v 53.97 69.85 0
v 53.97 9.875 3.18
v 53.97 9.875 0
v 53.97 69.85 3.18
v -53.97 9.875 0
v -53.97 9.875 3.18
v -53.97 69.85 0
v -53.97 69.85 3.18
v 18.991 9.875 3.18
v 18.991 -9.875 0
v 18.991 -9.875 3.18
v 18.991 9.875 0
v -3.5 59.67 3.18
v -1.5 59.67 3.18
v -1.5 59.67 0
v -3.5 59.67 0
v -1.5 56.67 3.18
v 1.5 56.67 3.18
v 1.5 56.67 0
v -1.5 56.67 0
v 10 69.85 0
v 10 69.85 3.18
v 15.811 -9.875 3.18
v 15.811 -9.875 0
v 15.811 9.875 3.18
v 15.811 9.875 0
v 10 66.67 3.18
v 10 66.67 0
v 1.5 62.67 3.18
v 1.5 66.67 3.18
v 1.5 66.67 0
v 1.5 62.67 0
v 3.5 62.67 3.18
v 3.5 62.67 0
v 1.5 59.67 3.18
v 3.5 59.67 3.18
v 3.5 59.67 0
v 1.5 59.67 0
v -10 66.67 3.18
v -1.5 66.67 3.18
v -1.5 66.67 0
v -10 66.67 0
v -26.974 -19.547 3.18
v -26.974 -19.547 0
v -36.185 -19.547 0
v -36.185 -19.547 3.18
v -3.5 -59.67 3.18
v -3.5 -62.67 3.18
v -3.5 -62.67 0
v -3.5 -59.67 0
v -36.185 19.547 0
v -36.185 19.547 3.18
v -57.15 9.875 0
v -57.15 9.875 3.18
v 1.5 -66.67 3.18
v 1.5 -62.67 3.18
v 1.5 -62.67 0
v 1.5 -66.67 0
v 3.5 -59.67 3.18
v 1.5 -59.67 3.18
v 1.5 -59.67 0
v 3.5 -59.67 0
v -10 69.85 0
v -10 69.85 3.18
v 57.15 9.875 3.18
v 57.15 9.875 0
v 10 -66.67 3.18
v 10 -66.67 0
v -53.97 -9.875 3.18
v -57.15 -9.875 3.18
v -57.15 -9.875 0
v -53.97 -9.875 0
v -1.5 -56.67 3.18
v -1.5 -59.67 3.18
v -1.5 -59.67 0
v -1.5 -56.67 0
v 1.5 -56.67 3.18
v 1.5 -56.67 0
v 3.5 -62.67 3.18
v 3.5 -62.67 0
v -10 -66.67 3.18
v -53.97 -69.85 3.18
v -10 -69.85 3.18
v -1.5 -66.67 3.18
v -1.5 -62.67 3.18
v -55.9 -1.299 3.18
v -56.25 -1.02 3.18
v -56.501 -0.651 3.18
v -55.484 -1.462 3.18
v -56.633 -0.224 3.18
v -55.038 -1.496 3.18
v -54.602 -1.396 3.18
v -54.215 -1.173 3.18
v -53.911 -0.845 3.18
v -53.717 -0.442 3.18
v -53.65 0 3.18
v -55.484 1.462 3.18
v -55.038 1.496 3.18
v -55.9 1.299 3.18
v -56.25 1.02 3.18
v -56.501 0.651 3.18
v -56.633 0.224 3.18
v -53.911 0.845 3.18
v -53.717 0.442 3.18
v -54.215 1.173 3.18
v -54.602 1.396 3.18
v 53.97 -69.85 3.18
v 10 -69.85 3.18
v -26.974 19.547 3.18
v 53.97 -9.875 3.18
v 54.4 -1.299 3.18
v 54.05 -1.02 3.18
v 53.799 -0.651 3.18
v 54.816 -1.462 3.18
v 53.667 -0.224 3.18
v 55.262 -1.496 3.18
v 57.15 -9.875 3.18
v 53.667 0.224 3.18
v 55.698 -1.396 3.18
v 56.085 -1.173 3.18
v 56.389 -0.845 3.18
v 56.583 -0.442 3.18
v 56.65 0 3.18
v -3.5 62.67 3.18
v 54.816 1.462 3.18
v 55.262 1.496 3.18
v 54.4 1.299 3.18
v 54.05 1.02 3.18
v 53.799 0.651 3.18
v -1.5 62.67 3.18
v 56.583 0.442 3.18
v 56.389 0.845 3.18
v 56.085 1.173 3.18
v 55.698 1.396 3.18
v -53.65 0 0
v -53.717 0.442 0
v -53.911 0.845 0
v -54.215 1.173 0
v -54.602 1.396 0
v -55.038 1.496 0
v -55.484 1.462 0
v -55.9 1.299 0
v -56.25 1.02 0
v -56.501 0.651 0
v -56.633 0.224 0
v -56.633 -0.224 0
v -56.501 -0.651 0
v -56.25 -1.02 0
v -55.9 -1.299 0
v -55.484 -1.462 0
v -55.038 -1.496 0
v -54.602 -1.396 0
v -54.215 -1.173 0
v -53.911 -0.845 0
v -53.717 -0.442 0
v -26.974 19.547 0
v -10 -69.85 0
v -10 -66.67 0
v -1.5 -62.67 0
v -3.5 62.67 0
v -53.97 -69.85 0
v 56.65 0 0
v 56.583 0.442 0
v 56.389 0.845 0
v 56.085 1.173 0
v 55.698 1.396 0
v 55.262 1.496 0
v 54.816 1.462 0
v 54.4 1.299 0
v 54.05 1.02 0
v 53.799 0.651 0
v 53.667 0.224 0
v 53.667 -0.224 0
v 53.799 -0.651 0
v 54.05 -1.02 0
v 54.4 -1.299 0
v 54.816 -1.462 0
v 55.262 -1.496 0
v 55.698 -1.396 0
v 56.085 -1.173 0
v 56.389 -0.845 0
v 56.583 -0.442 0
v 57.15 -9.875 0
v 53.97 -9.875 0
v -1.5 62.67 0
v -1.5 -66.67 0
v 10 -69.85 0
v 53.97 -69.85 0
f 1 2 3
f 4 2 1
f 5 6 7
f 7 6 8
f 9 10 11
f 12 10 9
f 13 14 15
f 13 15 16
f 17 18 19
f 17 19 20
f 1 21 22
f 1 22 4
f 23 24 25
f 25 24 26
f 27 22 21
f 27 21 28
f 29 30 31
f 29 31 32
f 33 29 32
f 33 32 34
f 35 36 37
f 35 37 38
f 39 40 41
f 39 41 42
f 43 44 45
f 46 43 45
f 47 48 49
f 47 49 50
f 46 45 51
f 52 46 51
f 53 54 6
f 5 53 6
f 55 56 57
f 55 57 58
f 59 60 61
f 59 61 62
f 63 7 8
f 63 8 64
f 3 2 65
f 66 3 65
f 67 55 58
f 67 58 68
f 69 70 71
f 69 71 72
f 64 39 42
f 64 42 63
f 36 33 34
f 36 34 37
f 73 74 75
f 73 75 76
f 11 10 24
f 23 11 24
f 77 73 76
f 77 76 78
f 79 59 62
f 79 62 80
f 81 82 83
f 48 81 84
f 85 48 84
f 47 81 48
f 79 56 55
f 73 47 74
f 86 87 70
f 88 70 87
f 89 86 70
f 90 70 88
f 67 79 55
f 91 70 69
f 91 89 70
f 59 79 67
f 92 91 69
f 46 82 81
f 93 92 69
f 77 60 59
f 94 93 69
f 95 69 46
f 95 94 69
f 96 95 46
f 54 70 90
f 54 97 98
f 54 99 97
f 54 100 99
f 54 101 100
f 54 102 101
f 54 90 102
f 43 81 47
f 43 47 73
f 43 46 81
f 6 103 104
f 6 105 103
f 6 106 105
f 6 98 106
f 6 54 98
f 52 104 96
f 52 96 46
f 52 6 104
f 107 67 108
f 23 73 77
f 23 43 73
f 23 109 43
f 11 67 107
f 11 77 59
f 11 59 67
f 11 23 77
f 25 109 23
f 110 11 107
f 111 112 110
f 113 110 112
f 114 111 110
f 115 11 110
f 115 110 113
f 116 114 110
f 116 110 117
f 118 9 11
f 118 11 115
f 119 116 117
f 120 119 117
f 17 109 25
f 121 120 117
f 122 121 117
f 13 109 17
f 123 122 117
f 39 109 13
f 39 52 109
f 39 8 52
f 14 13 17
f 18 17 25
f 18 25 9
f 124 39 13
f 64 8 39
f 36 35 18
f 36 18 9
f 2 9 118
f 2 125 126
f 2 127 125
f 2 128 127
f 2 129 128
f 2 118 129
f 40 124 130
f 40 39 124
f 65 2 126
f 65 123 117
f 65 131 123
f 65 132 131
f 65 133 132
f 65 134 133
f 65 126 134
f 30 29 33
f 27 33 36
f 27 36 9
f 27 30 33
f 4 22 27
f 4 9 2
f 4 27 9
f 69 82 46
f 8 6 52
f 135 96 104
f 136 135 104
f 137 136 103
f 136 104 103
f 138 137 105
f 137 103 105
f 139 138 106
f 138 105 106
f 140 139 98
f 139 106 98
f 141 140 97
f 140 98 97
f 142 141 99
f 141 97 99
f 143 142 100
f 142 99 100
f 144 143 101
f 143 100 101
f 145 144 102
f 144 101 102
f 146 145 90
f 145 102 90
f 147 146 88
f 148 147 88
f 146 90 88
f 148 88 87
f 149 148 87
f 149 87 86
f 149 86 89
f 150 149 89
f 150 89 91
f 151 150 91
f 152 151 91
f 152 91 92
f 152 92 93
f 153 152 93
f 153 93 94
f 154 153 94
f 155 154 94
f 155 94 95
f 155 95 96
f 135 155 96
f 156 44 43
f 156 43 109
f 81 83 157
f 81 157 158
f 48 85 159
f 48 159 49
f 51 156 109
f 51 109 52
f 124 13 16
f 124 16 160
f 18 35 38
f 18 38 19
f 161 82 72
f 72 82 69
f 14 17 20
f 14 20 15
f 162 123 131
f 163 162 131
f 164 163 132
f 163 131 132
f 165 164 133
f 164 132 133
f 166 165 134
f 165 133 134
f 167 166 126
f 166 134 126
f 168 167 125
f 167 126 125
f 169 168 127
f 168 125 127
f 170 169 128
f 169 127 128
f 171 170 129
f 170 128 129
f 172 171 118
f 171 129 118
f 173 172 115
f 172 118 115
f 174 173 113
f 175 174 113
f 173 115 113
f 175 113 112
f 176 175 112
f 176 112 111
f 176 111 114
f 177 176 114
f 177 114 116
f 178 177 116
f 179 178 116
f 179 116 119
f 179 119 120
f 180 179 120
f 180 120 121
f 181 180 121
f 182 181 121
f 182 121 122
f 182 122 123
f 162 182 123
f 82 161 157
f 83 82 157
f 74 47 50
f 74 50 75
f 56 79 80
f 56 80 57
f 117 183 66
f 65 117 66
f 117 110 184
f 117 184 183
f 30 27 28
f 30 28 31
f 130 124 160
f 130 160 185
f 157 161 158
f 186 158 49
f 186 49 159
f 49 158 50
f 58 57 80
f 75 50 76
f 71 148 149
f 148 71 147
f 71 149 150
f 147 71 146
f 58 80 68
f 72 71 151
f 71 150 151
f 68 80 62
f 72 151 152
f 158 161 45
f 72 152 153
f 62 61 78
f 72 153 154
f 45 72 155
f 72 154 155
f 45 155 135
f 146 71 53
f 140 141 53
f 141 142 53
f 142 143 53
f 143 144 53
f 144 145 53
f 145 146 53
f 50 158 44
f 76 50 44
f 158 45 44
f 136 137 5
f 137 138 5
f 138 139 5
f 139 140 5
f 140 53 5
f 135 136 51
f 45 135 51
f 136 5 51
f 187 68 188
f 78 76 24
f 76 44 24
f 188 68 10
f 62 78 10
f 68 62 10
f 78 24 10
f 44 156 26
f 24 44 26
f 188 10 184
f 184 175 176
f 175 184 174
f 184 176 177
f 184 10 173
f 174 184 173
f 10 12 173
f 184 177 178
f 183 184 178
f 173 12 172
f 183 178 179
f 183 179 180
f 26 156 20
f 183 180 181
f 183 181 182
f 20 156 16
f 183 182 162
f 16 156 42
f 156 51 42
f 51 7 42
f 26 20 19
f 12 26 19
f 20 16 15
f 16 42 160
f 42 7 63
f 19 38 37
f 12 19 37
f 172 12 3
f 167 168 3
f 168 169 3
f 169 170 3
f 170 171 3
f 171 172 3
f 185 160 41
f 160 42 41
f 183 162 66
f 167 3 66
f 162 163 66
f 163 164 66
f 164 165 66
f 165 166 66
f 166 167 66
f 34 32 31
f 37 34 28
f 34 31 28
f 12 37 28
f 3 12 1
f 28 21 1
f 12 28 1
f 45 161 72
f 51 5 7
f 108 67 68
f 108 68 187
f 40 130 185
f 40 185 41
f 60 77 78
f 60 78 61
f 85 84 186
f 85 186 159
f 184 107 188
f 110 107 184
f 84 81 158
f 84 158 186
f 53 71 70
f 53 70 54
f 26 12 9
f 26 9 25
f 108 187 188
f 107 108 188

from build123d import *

# Parameters (mm, degrees)
SKETCH1_W           = 114.3
SKETCH1_H           = 139.7
BOSS_EXTRUDE1_DEPTH = 3.18
SKETCH2_R           = 1.5
SKETCH2_W           = 3.18
SKETCH2_H           = 59.975
CUT_EXTRUDE1_DEPTH  = 4.18
SKETCH3_W           = 3.18
SKETCH3_H           = 19.75
CUT_EXTRUDE2_DEPTH  = 3.18
SKETCH4_W           = 9.210739152
SKETCH4_H           = 39.093434174
CUT_EXTRUDE3_DEPTH  = 3.18


with BuildPart() as part:
    # Sketch1 → Boss-Extrude1 (new body)
    with BuildSketch(Plane.XY):
        Rectangle(SKETCH1_W, SKETCH1_H)
    extrude(amount=BOSS_EXTRUDE1_DEPTH)

    # Sketch2 → Cut-Extrude1 (cut, through all)
    with BuildSketch(Plane.XY.offset(3.18)):
        with Locations((-55.15, 0)):
            Circle(SKETCH2_R)
        with Locations((55.15, 0)):
            Circle(SKETCH2_R)
        Polygon((-10, 69.85), (10, 69.85), (10, 66.67), (1.5, 66.67), (1.5, 62.67), (3.5, 62.67), (3.5, 59.67), (1.5, 59.67), (1.5, 56.67), (-1.5, 56.67), (-1.5, 59.67), (-3.5, 59.67), (-3.5, 62.67), (-1.5, 62.67), (-1.5, 66.67), (-10, 66.67), align=None)
        Polygon((-10, -69.85), (-10, -66.67), (-1.5, -66.67), (-1.5, -62.67), (-3.5, -62.67), (-3.5, -59.67), (-1.5, -59.67), (-1.5, -56.67), (1.5, -56.67), (1.5, -59.67), (3.5, -59.67), (3.5, -62.67), (1.5, -62.67), (1.5, -66.67), (10, -66.67), (10, -69.85), align=None)
        with Locations((-55.56, 39.8625)):
            Rectangle(SKETCH2_W, SKETCH2_H)
        with Locations((-55.56, -39.8625)):
            Rectangle(SKETCH2_W, SKETCH2_H)
        with Locations((55.56, -39.8625)):
            Rectangle(SKETCH2_W, SKETCH2_H)
        with Locations((55.56, 39.8625)):
            Rectangle(SKETCH2_W, SKETCH2_H)
    extrude(amount=-CUT_EXTRUDE1_DEPTH, mode=Mode.SUBTRACT)

    # Sketch3 → Cut-Extrude2 (cut)
    with BuildSketch(Plane(origin=(0, 0, 0), x_dir=(-1, 0, 0), z_dir=(0, 0, -1))):
        with Locations((-17.401387583, 0)):
            Rectangle(SKETCH3_W, SKETCH3_H)
    extrude(amount=-CUT_EXTRUDE2_DEPTH, mode=Mode.SUBTRACT)

    # Sketch4 → Cut-Extrude3 (cut)
    with BuildSketch(Plane(origin=(0, 0, 0), x_dir=(-1, 0, 0), z_dir=(0, 0, -1))):
        with Locations((31.579688853, 0)):
            Rectangle(SKETCH4_W, SKETCH4_H)
    extrude(amount=-CUT_EXTRUDE3_DEPTH, mode=Mode.SUBTRACT)


solid = part.part
